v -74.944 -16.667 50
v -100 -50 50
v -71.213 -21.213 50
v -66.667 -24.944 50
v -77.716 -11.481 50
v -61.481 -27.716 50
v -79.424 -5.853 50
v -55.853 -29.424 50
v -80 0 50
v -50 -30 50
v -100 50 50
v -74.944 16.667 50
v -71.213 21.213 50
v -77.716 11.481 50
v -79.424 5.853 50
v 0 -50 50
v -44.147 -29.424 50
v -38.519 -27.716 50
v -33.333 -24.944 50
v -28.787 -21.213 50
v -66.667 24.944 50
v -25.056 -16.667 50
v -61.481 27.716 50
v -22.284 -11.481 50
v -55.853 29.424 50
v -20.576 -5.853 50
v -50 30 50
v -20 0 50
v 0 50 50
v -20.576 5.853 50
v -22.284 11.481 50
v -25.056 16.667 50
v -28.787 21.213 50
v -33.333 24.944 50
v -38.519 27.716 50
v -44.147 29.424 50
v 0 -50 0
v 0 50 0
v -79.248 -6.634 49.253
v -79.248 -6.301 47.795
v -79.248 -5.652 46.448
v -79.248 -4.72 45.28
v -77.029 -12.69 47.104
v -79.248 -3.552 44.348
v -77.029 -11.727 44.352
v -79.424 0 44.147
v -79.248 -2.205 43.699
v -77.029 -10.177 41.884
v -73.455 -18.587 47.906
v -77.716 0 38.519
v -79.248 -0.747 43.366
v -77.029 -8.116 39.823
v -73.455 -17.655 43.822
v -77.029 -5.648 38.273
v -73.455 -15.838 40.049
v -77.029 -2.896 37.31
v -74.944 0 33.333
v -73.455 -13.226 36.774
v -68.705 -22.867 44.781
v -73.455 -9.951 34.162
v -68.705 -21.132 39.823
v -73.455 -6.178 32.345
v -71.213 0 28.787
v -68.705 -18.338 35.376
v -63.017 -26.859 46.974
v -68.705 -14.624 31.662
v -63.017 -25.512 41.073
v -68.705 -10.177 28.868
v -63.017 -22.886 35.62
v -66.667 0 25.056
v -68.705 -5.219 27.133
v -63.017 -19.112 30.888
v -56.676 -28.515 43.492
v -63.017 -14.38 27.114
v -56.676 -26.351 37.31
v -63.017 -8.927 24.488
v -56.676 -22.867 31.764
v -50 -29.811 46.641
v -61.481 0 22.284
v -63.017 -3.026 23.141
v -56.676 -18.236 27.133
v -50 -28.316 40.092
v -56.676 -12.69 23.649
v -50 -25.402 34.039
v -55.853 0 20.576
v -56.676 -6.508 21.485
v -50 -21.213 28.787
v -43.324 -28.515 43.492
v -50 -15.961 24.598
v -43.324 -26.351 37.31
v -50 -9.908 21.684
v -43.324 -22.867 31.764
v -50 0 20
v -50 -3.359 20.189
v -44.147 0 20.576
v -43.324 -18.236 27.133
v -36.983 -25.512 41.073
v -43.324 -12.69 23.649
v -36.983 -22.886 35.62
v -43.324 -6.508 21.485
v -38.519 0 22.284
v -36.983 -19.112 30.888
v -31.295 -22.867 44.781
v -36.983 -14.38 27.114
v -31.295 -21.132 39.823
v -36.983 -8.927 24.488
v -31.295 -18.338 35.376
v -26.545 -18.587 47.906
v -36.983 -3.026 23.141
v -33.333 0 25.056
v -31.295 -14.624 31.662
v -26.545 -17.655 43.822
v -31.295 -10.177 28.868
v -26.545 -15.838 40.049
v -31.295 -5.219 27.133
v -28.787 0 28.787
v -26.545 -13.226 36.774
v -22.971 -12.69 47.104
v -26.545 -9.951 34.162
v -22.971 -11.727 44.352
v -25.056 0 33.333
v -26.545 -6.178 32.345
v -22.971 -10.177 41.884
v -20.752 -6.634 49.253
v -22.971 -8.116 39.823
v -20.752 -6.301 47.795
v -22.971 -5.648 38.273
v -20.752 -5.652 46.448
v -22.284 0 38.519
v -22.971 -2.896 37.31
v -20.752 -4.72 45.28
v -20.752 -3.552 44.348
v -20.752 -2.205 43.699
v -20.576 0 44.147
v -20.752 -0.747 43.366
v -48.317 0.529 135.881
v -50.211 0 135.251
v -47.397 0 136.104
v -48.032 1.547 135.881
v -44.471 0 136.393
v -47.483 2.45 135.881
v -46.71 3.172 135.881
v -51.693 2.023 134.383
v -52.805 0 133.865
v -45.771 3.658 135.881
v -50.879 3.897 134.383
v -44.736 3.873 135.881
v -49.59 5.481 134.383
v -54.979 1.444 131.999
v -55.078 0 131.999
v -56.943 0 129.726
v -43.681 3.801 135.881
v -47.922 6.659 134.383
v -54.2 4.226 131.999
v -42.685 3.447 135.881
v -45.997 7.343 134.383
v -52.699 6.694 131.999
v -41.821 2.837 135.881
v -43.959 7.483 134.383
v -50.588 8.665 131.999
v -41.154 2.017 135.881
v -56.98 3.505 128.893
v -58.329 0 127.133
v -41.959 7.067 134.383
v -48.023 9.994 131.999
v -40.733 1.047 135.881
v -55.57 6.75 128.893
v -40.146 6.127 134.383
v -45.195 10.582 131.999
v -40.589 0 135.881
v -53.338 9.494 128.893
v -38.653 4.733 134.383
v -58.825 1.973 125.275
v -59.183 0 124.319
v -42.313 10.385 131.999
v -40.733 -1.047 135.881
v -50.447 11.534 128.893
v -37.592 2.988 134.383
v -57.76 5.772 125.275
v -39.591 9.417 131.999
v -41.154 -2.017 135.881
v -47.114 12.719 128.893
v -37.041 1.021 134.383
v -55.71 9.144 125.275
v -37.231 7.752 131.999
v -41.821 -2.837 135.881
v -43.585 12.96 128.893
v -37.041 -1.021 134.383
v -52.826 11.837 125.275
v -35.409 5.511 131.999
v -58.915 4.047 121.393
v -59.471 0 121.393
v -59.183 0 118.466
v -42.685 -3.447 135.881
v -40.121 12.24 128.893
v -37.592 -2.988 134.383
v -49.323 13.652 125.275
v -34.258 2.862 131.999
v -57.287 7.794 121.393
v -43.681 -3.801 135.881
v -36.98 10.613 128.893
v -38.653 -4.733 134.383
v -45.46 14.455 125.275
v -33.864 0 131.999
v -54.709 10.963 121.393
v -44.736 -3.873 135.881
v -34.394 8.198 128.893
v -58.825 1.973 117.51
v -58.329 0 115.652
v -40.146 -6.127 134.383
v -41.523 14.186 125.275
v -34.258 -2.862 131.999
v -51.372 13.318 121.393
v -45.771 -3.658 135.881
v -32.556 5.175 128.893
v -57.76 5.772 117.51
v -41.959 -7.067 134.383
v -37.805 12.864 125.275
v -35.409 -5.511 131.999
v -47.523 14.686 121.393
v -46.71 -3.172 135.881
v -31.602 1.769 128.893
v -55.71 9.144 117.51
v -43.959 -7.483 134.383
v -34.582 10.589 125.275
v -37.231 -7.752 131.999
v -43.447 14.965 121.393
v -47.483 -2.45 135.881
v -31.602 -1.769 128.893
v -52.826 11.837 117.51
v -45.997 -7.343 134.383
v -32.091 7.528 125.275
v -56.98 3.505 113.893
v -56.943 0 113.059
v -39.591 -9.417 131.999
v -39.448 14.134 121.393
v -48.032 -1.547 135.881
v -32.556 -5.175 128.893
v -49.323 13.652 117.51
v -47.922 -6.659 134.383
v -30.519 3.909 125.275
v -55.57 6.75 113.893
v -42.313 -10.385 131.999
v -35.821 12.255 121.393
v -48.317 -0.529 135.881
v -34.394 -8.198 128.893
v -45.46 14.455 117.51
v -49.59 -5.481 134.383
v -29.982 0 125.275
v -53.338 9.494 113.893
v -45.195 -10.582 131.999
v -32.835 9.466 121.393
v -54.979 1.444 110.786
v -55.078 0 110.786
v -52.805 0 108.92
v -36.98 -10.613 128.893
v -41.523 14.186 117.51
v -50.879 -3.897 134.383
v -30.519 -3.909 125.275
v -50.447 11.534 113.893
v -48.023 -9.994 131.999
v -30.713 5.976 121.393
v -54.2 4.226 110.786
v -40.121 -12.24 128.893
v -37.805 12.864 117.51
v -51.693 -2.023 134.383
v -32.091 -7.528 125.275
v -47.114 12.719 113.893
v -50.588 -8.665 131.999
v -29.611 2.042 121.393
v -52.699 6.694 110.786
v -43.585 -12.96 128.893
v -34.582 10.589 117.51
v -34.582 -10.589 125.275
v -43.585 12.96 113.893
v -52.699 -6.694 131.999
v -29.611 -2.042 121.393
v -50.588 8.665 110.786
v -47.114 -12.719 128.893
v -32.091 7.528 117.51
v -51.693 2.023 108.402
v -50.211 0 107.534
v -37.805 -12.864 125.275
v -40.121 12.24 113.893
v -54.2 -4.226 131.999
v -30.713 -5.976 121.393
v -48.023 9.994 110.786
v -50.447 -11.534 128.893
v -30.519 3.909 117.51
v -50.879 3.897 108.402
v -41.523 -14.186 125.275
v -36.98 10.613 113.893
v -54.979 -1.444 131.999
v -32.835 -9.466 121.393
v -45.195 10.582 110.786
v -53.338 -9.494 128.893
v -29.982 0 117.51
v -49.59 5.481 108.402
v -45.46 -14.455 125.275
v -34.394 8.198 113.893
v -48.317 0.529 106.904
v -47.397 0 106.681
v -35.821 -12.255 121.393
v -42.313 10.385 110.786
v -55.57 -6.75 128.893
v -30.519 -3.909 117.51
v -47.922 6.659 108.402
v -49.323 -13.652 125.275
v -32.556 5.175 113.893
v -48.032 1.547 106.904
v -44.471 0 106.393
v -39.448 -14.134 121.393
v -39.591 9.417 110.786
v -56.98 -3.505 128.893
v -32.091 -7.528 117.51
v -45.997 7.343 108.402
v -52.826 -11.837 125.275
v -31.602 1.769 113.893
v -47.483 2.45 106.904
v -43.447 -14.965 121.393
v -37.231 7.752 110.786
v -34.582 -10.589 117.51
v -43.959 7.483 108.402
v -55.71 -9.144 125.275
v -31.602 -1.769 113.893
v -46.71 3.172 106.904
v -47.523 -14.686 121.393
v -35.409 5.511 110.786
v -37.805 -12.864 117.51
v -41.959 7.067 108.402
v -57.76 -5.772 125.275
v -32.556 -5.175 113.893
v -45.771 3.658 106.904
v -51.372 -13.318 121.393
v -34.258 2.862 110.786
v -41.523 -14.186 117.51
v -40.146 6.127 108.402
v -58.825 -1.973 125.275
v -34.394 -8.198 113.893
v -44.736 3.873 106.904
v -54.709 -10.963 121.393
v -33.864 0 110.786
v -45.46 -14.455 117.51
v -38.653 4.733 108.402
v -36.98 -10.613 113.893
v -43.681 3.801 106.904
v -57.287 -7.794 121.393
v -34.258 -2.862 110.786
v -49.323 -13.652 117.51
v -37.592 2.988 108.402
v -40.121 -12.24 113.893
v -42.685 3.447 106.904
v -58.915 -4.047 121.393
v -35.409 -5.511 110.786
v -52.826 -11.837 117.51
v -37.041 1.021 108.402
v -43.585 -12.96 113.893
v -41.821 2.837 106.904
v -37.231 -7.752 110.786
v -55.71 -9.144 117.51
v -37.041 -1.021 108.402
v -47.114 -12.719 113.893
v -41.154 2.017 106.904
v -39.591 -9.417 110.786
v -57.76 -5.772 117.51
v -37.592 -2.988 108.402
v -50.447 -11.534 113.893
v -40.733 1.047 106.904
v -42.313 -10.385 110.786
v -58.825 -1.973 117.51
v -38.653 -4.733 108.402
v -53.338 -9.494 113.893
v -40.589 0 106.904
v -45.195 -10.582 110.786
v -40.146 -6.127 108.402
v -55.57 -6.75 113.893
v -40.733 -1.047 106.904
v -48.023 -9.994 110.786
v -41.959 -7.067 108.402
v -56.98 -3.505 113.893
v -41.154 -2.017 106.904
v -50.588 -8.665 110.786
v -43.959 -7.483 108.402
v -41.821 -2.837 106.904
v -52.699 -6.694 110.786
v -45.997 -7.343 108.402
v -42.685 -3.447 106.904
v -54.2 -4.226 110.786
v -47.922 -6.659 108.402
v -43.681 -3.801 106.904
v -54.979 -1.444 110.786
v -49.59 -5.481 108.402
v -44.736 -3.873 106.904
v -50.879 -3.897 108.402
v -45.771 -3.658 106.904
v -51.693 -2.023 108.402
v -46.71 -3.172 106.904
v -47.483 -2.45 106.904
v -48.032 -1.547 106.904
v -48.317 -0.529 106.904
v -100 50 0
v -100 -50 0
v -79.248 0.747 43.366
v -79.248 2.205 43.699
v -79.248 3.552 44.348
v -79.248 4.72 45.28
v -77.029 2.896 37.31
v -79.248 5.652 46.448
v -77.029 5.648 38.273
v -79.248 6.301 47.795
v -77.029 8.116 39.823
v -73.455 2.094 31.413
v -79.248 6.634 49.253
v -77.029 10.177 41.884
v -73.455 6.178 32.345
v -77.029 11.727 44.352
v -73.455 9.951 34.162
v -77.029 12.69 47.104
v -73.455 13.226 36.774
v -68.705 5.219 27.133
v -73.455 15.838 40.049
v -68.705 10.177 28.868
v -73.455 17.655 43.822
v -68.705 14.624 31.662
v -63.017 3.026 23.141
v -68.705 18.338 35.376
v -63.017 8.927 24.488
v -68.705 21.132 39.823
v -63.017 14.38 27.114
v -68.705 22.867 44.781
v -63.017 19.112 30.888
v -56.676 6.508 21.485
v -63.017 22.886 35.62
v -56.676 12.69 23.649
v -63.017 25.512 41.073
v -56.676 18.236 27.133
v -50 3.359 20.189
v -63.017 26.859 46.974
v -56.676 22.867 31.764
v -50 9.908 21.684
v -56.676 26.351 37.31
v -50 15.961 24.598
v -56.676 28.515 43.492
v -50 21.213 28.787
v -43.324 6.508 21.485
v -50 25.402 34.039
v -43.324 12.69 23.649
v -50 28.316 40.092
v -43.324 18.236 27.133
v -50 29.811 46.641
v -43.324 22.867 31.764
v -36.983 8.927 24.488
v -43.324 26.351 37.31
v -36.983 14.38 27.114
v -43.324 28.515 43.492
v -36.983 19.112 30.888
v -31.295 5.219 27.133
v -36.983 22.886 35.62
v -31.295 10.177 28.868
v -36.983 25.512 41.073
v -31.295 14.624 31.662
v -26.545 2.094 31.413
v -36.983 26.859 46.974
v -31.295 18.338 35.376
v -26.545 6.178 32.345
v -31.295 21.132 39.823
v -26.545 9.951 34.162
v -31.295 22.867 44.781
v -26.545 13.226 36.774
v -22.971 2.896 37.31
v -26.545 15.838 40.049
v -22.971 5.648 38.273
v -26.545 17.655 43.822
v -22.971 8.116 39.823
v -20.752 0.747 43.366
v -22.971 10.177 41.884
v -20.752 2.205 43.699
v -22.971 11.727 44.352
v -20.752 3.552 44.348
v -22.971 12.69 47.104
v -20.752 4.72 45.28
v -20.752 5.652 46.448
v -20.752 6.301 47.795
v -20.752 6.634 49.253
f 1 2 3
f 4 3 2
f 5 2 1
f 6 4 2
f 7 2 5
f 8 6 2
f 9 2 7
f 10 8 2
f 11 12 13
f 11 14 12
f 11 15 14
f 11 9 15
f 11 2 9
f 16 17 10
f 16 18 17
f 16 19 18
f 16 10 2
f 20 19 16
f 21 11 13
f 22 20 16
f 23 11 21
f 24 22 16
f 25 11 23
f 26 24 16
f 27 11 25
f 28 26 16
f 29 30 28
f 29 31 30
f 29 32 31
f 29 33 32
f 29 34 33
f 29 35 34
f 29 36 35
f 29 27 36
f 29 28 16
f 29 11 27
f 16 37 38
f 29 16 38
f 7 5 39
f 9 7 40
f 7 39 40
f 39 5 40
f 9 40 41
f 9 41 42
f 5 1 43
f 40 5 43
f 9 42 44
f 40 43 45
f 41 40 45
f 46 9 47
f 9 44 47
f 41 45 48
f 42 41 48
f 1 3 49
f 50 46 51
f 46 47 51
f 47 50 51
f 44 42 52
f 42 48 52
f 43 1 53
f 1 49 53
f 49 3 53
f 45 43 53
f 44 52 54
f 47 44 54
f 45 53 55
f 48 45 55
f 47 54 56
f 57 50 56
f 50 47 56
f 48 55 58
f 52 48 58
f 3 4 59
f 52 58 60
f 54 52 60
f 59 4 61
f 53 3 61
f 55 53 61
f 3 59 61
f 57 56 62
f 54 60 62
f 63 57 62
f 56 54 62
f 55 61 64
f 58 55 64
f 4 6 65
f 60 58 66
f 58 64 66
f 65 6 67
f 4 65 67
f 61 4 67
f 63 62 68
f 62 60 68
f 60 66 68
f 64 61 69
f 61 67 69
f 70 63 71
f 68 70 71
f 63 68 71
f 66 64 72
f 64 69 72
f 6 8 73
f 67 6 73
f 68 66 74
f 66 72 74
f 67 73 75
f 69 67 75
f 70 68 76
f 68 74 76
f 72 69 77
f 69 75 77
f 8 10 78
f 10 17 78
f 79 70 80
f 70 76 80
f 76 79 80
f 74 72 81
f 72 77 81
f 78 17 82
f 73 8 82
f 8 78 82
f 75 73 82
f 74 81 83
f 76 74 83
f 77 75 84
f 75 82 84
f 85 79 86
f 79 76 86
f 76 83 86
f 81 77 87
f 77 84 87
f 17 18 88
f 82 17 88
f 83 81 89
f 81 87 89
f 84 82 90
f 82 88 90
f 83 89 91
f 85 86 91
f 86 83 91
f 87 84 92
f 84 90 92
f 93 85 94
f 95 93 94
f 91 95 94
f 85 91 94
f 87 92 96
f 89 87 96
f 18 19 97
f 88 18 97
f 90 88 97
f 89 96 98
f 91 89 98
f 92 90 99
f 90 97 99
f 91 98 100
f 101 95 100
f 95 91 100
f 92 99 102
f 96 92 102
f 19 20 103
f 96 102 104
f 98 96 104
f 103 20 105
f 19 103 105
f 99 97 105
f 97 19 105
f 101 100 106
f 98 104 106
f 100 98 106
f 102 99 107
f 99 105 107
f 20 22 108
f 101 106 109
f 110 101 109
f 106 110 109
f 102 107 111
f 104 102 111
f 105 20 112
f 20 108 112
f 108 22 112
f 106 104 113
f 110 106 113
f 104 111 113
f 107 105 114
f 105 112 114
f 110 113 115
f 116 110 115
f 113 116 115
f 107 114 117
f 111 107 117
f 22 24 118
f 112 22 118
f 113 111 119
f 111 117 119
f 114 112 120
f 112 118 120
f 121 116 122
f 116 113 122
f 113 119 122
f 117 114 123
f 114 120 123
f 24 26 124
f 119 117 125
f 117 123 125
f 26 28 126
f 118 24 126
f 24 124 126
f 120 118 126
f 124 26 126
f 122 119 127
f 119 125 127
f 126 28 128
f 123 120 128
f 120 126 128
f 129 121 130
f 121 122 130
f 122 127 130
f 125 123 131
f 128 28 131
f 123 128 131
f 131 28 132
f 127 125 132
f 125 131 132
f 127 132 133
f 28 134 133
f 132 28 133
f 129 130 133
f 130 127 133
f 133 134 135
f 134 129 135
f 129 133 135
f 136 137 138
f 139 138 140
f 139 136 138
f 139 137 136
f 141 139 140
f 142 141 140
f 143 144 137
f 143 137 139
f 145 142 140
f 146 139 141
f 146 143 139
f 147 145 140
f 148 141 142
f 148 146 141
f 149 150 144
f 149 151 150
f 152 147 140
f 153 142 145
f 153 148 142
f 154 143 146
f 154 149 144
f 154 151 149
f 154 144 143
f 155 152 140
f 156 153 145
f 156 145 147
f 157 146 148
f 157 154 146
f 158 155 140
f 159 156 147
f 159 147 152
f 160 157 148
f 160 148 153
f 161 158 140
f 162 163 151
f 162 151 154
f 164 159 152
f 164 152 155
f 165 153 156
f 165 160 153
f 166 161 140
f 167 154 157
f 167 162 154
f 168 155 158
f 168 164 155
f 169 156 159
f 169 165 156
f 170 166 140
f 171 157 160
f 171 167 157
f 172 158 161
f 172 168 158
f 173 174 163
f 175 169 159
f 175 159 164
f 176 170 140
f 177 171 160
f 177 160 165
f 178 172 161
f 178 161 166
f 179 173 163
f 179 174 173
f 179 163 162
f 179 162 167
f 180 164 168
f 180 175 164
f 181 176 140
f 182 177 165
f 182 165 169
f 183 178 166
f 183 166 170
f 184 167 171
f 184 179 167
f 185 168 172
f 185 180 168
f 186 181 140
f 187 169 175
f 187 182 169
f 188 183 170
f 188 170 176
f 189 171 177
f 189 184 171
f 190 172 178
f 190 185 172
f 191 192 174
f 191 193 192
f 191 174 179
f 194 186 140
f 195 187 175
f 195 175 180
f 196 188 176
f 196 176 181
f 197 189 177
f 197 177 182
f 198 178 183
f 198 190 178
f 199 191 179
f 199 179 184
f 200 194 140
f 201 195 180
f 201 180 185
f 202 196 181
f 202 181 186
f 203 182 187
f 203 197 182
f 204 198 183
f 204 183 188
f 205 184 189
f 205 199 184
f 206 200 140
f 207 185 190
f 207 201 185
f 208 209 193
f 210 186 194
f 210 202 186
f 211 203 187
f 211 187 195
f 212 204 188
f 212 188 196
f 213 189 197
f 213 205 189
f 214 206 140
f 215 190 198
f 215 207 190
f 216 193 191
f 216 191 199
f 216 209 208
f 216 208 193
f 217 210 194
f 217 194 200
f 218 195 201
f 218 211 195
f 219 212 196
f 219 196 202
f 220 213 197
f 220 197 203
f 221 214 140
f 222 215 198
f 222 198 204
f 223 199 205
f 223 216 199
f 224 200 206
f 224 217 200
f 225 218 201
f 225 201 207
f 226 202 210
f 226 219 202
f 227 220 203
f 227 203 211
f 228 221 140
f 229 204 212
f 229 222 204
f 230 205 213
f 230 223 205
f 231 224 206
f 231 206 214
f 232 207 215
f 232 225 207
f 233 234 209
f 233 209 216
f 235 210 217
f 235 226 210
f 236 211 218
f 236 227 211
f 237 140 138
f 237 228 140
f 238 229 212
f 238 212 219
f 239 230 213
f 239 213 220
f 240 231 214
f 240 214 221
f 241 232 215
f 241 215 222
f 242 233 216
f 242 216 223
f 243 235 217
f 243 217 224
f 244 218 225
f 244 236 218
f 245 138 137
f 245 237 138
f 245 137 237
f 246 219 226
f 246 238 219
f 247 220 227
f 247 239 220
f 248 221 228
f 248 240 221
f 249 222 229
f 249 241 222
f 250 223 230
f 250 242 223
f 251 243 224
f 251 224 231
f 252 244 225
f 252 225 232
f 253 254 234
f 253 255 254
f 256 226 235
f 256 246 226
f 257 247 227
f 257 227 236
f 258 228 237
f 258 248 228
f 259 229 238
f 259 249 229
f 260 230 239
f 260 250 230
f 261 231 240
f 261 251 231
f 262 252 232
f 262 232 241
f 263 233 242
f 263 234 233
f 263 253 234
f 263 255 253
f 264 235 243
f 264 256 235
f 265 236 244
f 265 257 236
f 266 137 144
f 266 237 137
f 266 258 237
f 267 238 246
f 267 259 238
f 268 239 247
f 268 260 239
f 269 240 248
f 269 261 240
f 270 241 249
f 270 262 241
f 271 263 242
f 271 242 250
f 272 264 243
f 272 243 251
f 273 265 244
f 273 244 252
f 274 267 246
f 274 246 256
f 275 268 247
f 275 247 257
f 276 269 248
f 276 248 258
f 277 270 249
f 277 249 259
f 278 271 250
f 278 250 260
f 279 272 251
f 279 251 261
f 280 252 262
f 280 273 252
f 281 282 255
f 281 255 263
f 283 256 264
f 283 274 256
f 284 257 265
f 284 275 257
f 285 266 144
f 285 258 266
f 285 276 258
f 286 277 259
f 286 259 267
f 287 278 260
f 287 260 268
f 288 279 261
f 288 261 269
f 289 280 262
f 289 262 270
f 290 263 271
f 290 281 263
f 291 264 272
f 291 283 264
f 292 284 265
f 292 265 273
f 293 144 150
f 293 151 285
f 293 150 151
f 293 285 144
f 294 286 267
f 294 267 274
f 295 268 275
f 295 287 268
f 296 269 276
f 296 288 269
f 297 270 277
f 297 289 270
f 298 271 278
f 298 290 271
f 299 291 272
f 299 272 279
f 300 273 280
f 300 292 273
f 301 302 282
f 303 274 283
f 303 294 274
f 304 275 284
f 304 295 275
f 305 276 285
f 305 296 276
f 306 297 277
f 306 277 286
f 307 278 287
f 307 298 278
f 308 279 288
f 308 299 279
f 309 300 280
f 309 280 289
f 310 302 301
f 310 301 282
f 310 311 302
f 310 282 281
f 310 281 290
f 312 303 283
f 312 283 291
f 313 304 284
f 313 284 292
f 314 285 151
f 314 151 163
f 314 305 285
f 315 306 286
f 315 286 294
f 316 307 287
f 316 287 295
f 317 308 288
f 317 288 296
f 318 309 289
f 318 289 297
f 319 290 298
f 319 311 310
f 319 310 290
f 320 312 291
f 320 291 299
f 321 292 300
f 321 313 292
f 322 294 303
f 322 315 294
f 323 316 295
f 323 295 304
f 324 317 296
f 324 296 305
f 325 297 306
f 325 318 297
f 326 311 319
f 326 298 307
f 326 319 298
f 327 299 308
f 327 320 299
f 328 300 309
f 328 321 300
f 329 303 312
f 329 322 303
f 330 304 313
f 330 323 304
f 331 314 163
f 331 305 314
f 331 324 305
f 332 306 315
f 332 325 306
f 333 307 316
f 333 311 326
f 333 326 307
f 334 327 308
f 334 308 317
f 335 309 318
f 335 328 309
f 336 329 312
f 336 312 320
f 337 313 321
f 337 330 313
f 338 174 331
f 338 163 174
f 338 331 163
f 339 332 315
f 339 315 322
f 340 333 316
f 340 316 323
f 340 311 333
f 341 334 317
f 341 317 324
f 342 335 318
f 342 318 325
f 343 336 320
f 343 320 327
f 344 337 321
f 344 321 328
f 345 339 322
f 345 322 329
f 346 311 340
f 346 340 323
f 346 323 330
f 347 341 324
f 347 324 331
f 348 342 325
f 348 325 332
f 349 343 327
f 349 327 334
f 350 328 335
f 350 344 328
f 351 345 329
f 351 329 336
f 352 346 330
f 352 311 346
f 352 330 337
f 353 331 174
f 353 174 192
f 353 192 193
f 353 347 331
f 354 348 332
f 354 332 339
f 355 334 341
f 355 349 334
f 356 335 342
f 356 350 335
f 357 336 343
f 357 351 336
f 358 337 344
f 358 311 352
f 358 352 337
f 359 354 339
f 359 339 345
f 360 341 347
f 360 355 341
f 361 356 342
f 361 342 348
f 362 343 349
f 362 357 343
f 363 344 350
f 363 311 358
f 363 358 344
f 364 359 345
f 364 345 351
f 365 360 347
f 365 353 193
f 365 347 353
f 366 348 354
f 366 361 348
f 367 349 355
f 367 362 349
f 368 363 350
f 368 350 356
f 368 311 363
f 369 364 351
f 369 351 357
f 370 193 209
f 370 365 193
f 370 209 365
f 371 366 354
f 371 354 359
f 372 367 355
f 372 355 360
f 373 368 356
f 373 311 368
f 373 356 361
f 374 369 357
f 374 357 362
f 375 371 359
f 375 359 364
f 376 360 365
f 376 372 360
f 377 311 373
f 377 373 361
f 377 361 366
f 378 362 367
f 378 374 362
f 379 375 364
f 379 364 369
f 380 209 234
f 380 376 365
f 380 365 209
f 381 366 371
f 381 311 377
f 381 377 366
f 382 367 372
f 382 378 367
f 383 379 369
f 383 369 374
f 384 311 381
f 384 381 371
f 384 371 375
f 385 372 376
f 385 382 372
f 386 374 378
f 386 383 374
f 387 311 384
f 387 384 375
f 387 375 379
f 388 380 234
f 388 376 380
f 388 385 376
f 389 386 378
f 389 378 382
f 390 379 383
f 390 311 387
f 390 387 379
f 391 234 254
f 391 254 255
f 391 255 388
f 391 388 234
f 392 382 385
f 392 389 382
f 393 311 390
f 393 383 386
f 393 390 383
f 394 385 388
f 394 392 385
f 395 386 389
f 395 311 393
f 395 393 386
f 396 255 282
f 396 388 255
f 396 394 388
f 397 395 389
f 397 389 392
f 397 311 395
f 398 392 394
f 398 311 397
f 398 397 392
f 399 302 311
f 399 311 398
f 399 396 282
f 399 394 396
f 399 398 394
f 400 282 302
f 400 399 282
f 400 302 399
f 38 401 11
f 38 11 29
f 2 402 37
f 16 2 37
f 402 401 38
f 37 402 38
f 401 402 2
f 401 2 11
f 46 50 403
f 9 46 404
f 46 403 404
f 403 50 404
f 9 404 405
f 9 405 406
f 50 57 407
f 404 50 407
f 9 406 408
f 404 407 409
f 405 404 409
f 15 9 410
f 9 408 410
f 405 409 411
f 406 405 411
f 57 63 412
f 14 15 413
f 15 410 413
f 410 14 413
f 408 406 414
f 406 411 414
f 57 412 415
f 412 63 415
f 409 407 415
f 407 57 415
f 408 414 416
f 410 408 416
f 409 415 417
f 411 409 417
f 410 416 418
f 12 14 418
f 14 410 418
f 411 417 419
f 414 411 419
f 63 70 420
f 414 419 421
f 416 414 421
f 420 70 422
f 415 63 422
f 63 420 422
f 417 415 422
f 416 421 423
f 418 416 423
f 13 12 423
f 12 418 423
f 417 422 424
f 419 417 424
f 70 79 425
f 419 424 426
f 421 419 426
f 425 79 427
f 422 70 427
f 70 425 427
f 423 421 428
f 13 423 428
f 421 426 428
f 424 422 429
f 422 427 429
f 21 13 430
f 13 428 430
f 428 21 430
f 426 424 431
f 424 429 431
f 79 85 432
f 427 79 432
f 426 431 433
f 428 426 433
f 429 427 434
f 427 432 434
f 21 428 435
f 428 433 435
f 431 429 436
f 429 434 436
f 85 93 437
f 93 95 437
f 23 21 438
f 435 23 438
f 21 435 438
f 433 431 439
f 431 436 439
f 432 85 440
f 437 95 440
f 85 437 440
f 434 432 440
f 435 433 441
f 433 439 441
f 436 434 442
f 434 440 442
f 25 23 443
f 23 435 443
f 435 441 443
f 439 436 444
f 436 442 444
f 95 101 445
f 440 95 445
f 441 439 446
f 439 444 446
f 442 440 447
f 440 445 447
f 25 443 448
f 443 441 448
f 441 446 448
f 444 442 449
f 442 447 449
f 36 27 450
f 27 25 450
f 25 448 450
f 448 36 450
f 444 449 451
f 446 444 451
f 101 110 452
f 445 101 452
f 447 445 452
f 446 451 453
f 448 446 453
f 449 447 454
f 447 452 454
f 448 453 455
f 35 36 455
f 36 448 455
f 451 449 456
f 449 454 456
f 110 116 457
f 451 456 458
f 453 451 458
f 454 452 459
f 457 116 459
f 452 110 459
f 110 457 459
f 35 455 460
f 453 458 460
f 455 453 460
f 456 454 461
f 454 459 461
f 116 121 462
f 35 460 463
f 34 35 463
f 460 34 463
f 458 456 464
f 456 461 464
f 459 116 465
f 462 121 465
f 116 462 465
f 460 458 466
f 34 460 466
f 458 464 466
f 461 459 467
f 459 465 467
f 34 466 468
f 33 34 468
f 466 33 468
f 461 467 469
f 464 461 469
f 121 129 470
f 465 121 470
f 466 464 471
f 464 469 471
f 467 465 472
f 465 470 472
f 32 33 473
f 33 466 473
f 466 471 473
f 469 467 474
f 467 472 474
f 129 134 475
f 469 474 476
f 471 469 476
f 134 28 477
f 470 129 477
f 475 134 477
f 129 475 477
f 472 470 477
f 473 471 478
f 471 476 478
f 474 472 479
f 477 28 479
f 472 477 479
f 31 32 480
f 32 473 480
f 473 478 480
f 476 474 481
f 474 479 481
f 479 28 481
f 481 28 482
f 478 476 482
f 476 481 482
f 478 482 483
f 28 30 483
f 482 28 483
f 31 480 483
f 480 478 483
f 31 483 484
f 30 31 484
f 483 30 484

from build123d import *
from build123d import SkipClean  # not in build123d's __all__

# Parameters (mm, degrees)
F0_W     = 100
F0_H     = 100
F1_DEPTH = 50


with BuildPart() as f1:
    # F0 (on Top) → F1 (new body)
    with BuildSketch(Plane.XY):
        with Locations((-50, 0)):
            Rectangle(F0_W, F0_H)
    extrude(amount=F1_DEPTH)

    # F2 (on Front) → F3 (revolve, cut)
    with BuildSketch(Plane.XZ):
        with BuildLine():
            Line((-20, 50), (-80, 50))
            ThreePointArc((-80, 50), (-50, 20), (-20, 50))
        make_face()
    with SkipClean():  # cleaning this boolean's faces spoils the solid; the shape is the same uncleaned
        revolve(axis=Axis((-50, 0, 50), (1, 0, 0)), mode=Mode.SUBTRACT)


with BuildPart() as f6:
    # F5 (on Front) → F6 (revolve)
    with BuildSketch(Plane.XZ):
        with BuildLine():
            Line((-44.4710201616, 106.3925326908), (-44.4710201616, 136.3925326908))
            ThreePointArc((-44.4710201616, 136.3925326908), (-59.4710201616, 121.3925326908), (-44.4710201616, 106.3925326908))
        make_face()
    revolve(axis=Axis((-44.4710201616, 0, 121.3925326908), (0, 0, -1)))


solid = Compound([f1.part, f6.part])
